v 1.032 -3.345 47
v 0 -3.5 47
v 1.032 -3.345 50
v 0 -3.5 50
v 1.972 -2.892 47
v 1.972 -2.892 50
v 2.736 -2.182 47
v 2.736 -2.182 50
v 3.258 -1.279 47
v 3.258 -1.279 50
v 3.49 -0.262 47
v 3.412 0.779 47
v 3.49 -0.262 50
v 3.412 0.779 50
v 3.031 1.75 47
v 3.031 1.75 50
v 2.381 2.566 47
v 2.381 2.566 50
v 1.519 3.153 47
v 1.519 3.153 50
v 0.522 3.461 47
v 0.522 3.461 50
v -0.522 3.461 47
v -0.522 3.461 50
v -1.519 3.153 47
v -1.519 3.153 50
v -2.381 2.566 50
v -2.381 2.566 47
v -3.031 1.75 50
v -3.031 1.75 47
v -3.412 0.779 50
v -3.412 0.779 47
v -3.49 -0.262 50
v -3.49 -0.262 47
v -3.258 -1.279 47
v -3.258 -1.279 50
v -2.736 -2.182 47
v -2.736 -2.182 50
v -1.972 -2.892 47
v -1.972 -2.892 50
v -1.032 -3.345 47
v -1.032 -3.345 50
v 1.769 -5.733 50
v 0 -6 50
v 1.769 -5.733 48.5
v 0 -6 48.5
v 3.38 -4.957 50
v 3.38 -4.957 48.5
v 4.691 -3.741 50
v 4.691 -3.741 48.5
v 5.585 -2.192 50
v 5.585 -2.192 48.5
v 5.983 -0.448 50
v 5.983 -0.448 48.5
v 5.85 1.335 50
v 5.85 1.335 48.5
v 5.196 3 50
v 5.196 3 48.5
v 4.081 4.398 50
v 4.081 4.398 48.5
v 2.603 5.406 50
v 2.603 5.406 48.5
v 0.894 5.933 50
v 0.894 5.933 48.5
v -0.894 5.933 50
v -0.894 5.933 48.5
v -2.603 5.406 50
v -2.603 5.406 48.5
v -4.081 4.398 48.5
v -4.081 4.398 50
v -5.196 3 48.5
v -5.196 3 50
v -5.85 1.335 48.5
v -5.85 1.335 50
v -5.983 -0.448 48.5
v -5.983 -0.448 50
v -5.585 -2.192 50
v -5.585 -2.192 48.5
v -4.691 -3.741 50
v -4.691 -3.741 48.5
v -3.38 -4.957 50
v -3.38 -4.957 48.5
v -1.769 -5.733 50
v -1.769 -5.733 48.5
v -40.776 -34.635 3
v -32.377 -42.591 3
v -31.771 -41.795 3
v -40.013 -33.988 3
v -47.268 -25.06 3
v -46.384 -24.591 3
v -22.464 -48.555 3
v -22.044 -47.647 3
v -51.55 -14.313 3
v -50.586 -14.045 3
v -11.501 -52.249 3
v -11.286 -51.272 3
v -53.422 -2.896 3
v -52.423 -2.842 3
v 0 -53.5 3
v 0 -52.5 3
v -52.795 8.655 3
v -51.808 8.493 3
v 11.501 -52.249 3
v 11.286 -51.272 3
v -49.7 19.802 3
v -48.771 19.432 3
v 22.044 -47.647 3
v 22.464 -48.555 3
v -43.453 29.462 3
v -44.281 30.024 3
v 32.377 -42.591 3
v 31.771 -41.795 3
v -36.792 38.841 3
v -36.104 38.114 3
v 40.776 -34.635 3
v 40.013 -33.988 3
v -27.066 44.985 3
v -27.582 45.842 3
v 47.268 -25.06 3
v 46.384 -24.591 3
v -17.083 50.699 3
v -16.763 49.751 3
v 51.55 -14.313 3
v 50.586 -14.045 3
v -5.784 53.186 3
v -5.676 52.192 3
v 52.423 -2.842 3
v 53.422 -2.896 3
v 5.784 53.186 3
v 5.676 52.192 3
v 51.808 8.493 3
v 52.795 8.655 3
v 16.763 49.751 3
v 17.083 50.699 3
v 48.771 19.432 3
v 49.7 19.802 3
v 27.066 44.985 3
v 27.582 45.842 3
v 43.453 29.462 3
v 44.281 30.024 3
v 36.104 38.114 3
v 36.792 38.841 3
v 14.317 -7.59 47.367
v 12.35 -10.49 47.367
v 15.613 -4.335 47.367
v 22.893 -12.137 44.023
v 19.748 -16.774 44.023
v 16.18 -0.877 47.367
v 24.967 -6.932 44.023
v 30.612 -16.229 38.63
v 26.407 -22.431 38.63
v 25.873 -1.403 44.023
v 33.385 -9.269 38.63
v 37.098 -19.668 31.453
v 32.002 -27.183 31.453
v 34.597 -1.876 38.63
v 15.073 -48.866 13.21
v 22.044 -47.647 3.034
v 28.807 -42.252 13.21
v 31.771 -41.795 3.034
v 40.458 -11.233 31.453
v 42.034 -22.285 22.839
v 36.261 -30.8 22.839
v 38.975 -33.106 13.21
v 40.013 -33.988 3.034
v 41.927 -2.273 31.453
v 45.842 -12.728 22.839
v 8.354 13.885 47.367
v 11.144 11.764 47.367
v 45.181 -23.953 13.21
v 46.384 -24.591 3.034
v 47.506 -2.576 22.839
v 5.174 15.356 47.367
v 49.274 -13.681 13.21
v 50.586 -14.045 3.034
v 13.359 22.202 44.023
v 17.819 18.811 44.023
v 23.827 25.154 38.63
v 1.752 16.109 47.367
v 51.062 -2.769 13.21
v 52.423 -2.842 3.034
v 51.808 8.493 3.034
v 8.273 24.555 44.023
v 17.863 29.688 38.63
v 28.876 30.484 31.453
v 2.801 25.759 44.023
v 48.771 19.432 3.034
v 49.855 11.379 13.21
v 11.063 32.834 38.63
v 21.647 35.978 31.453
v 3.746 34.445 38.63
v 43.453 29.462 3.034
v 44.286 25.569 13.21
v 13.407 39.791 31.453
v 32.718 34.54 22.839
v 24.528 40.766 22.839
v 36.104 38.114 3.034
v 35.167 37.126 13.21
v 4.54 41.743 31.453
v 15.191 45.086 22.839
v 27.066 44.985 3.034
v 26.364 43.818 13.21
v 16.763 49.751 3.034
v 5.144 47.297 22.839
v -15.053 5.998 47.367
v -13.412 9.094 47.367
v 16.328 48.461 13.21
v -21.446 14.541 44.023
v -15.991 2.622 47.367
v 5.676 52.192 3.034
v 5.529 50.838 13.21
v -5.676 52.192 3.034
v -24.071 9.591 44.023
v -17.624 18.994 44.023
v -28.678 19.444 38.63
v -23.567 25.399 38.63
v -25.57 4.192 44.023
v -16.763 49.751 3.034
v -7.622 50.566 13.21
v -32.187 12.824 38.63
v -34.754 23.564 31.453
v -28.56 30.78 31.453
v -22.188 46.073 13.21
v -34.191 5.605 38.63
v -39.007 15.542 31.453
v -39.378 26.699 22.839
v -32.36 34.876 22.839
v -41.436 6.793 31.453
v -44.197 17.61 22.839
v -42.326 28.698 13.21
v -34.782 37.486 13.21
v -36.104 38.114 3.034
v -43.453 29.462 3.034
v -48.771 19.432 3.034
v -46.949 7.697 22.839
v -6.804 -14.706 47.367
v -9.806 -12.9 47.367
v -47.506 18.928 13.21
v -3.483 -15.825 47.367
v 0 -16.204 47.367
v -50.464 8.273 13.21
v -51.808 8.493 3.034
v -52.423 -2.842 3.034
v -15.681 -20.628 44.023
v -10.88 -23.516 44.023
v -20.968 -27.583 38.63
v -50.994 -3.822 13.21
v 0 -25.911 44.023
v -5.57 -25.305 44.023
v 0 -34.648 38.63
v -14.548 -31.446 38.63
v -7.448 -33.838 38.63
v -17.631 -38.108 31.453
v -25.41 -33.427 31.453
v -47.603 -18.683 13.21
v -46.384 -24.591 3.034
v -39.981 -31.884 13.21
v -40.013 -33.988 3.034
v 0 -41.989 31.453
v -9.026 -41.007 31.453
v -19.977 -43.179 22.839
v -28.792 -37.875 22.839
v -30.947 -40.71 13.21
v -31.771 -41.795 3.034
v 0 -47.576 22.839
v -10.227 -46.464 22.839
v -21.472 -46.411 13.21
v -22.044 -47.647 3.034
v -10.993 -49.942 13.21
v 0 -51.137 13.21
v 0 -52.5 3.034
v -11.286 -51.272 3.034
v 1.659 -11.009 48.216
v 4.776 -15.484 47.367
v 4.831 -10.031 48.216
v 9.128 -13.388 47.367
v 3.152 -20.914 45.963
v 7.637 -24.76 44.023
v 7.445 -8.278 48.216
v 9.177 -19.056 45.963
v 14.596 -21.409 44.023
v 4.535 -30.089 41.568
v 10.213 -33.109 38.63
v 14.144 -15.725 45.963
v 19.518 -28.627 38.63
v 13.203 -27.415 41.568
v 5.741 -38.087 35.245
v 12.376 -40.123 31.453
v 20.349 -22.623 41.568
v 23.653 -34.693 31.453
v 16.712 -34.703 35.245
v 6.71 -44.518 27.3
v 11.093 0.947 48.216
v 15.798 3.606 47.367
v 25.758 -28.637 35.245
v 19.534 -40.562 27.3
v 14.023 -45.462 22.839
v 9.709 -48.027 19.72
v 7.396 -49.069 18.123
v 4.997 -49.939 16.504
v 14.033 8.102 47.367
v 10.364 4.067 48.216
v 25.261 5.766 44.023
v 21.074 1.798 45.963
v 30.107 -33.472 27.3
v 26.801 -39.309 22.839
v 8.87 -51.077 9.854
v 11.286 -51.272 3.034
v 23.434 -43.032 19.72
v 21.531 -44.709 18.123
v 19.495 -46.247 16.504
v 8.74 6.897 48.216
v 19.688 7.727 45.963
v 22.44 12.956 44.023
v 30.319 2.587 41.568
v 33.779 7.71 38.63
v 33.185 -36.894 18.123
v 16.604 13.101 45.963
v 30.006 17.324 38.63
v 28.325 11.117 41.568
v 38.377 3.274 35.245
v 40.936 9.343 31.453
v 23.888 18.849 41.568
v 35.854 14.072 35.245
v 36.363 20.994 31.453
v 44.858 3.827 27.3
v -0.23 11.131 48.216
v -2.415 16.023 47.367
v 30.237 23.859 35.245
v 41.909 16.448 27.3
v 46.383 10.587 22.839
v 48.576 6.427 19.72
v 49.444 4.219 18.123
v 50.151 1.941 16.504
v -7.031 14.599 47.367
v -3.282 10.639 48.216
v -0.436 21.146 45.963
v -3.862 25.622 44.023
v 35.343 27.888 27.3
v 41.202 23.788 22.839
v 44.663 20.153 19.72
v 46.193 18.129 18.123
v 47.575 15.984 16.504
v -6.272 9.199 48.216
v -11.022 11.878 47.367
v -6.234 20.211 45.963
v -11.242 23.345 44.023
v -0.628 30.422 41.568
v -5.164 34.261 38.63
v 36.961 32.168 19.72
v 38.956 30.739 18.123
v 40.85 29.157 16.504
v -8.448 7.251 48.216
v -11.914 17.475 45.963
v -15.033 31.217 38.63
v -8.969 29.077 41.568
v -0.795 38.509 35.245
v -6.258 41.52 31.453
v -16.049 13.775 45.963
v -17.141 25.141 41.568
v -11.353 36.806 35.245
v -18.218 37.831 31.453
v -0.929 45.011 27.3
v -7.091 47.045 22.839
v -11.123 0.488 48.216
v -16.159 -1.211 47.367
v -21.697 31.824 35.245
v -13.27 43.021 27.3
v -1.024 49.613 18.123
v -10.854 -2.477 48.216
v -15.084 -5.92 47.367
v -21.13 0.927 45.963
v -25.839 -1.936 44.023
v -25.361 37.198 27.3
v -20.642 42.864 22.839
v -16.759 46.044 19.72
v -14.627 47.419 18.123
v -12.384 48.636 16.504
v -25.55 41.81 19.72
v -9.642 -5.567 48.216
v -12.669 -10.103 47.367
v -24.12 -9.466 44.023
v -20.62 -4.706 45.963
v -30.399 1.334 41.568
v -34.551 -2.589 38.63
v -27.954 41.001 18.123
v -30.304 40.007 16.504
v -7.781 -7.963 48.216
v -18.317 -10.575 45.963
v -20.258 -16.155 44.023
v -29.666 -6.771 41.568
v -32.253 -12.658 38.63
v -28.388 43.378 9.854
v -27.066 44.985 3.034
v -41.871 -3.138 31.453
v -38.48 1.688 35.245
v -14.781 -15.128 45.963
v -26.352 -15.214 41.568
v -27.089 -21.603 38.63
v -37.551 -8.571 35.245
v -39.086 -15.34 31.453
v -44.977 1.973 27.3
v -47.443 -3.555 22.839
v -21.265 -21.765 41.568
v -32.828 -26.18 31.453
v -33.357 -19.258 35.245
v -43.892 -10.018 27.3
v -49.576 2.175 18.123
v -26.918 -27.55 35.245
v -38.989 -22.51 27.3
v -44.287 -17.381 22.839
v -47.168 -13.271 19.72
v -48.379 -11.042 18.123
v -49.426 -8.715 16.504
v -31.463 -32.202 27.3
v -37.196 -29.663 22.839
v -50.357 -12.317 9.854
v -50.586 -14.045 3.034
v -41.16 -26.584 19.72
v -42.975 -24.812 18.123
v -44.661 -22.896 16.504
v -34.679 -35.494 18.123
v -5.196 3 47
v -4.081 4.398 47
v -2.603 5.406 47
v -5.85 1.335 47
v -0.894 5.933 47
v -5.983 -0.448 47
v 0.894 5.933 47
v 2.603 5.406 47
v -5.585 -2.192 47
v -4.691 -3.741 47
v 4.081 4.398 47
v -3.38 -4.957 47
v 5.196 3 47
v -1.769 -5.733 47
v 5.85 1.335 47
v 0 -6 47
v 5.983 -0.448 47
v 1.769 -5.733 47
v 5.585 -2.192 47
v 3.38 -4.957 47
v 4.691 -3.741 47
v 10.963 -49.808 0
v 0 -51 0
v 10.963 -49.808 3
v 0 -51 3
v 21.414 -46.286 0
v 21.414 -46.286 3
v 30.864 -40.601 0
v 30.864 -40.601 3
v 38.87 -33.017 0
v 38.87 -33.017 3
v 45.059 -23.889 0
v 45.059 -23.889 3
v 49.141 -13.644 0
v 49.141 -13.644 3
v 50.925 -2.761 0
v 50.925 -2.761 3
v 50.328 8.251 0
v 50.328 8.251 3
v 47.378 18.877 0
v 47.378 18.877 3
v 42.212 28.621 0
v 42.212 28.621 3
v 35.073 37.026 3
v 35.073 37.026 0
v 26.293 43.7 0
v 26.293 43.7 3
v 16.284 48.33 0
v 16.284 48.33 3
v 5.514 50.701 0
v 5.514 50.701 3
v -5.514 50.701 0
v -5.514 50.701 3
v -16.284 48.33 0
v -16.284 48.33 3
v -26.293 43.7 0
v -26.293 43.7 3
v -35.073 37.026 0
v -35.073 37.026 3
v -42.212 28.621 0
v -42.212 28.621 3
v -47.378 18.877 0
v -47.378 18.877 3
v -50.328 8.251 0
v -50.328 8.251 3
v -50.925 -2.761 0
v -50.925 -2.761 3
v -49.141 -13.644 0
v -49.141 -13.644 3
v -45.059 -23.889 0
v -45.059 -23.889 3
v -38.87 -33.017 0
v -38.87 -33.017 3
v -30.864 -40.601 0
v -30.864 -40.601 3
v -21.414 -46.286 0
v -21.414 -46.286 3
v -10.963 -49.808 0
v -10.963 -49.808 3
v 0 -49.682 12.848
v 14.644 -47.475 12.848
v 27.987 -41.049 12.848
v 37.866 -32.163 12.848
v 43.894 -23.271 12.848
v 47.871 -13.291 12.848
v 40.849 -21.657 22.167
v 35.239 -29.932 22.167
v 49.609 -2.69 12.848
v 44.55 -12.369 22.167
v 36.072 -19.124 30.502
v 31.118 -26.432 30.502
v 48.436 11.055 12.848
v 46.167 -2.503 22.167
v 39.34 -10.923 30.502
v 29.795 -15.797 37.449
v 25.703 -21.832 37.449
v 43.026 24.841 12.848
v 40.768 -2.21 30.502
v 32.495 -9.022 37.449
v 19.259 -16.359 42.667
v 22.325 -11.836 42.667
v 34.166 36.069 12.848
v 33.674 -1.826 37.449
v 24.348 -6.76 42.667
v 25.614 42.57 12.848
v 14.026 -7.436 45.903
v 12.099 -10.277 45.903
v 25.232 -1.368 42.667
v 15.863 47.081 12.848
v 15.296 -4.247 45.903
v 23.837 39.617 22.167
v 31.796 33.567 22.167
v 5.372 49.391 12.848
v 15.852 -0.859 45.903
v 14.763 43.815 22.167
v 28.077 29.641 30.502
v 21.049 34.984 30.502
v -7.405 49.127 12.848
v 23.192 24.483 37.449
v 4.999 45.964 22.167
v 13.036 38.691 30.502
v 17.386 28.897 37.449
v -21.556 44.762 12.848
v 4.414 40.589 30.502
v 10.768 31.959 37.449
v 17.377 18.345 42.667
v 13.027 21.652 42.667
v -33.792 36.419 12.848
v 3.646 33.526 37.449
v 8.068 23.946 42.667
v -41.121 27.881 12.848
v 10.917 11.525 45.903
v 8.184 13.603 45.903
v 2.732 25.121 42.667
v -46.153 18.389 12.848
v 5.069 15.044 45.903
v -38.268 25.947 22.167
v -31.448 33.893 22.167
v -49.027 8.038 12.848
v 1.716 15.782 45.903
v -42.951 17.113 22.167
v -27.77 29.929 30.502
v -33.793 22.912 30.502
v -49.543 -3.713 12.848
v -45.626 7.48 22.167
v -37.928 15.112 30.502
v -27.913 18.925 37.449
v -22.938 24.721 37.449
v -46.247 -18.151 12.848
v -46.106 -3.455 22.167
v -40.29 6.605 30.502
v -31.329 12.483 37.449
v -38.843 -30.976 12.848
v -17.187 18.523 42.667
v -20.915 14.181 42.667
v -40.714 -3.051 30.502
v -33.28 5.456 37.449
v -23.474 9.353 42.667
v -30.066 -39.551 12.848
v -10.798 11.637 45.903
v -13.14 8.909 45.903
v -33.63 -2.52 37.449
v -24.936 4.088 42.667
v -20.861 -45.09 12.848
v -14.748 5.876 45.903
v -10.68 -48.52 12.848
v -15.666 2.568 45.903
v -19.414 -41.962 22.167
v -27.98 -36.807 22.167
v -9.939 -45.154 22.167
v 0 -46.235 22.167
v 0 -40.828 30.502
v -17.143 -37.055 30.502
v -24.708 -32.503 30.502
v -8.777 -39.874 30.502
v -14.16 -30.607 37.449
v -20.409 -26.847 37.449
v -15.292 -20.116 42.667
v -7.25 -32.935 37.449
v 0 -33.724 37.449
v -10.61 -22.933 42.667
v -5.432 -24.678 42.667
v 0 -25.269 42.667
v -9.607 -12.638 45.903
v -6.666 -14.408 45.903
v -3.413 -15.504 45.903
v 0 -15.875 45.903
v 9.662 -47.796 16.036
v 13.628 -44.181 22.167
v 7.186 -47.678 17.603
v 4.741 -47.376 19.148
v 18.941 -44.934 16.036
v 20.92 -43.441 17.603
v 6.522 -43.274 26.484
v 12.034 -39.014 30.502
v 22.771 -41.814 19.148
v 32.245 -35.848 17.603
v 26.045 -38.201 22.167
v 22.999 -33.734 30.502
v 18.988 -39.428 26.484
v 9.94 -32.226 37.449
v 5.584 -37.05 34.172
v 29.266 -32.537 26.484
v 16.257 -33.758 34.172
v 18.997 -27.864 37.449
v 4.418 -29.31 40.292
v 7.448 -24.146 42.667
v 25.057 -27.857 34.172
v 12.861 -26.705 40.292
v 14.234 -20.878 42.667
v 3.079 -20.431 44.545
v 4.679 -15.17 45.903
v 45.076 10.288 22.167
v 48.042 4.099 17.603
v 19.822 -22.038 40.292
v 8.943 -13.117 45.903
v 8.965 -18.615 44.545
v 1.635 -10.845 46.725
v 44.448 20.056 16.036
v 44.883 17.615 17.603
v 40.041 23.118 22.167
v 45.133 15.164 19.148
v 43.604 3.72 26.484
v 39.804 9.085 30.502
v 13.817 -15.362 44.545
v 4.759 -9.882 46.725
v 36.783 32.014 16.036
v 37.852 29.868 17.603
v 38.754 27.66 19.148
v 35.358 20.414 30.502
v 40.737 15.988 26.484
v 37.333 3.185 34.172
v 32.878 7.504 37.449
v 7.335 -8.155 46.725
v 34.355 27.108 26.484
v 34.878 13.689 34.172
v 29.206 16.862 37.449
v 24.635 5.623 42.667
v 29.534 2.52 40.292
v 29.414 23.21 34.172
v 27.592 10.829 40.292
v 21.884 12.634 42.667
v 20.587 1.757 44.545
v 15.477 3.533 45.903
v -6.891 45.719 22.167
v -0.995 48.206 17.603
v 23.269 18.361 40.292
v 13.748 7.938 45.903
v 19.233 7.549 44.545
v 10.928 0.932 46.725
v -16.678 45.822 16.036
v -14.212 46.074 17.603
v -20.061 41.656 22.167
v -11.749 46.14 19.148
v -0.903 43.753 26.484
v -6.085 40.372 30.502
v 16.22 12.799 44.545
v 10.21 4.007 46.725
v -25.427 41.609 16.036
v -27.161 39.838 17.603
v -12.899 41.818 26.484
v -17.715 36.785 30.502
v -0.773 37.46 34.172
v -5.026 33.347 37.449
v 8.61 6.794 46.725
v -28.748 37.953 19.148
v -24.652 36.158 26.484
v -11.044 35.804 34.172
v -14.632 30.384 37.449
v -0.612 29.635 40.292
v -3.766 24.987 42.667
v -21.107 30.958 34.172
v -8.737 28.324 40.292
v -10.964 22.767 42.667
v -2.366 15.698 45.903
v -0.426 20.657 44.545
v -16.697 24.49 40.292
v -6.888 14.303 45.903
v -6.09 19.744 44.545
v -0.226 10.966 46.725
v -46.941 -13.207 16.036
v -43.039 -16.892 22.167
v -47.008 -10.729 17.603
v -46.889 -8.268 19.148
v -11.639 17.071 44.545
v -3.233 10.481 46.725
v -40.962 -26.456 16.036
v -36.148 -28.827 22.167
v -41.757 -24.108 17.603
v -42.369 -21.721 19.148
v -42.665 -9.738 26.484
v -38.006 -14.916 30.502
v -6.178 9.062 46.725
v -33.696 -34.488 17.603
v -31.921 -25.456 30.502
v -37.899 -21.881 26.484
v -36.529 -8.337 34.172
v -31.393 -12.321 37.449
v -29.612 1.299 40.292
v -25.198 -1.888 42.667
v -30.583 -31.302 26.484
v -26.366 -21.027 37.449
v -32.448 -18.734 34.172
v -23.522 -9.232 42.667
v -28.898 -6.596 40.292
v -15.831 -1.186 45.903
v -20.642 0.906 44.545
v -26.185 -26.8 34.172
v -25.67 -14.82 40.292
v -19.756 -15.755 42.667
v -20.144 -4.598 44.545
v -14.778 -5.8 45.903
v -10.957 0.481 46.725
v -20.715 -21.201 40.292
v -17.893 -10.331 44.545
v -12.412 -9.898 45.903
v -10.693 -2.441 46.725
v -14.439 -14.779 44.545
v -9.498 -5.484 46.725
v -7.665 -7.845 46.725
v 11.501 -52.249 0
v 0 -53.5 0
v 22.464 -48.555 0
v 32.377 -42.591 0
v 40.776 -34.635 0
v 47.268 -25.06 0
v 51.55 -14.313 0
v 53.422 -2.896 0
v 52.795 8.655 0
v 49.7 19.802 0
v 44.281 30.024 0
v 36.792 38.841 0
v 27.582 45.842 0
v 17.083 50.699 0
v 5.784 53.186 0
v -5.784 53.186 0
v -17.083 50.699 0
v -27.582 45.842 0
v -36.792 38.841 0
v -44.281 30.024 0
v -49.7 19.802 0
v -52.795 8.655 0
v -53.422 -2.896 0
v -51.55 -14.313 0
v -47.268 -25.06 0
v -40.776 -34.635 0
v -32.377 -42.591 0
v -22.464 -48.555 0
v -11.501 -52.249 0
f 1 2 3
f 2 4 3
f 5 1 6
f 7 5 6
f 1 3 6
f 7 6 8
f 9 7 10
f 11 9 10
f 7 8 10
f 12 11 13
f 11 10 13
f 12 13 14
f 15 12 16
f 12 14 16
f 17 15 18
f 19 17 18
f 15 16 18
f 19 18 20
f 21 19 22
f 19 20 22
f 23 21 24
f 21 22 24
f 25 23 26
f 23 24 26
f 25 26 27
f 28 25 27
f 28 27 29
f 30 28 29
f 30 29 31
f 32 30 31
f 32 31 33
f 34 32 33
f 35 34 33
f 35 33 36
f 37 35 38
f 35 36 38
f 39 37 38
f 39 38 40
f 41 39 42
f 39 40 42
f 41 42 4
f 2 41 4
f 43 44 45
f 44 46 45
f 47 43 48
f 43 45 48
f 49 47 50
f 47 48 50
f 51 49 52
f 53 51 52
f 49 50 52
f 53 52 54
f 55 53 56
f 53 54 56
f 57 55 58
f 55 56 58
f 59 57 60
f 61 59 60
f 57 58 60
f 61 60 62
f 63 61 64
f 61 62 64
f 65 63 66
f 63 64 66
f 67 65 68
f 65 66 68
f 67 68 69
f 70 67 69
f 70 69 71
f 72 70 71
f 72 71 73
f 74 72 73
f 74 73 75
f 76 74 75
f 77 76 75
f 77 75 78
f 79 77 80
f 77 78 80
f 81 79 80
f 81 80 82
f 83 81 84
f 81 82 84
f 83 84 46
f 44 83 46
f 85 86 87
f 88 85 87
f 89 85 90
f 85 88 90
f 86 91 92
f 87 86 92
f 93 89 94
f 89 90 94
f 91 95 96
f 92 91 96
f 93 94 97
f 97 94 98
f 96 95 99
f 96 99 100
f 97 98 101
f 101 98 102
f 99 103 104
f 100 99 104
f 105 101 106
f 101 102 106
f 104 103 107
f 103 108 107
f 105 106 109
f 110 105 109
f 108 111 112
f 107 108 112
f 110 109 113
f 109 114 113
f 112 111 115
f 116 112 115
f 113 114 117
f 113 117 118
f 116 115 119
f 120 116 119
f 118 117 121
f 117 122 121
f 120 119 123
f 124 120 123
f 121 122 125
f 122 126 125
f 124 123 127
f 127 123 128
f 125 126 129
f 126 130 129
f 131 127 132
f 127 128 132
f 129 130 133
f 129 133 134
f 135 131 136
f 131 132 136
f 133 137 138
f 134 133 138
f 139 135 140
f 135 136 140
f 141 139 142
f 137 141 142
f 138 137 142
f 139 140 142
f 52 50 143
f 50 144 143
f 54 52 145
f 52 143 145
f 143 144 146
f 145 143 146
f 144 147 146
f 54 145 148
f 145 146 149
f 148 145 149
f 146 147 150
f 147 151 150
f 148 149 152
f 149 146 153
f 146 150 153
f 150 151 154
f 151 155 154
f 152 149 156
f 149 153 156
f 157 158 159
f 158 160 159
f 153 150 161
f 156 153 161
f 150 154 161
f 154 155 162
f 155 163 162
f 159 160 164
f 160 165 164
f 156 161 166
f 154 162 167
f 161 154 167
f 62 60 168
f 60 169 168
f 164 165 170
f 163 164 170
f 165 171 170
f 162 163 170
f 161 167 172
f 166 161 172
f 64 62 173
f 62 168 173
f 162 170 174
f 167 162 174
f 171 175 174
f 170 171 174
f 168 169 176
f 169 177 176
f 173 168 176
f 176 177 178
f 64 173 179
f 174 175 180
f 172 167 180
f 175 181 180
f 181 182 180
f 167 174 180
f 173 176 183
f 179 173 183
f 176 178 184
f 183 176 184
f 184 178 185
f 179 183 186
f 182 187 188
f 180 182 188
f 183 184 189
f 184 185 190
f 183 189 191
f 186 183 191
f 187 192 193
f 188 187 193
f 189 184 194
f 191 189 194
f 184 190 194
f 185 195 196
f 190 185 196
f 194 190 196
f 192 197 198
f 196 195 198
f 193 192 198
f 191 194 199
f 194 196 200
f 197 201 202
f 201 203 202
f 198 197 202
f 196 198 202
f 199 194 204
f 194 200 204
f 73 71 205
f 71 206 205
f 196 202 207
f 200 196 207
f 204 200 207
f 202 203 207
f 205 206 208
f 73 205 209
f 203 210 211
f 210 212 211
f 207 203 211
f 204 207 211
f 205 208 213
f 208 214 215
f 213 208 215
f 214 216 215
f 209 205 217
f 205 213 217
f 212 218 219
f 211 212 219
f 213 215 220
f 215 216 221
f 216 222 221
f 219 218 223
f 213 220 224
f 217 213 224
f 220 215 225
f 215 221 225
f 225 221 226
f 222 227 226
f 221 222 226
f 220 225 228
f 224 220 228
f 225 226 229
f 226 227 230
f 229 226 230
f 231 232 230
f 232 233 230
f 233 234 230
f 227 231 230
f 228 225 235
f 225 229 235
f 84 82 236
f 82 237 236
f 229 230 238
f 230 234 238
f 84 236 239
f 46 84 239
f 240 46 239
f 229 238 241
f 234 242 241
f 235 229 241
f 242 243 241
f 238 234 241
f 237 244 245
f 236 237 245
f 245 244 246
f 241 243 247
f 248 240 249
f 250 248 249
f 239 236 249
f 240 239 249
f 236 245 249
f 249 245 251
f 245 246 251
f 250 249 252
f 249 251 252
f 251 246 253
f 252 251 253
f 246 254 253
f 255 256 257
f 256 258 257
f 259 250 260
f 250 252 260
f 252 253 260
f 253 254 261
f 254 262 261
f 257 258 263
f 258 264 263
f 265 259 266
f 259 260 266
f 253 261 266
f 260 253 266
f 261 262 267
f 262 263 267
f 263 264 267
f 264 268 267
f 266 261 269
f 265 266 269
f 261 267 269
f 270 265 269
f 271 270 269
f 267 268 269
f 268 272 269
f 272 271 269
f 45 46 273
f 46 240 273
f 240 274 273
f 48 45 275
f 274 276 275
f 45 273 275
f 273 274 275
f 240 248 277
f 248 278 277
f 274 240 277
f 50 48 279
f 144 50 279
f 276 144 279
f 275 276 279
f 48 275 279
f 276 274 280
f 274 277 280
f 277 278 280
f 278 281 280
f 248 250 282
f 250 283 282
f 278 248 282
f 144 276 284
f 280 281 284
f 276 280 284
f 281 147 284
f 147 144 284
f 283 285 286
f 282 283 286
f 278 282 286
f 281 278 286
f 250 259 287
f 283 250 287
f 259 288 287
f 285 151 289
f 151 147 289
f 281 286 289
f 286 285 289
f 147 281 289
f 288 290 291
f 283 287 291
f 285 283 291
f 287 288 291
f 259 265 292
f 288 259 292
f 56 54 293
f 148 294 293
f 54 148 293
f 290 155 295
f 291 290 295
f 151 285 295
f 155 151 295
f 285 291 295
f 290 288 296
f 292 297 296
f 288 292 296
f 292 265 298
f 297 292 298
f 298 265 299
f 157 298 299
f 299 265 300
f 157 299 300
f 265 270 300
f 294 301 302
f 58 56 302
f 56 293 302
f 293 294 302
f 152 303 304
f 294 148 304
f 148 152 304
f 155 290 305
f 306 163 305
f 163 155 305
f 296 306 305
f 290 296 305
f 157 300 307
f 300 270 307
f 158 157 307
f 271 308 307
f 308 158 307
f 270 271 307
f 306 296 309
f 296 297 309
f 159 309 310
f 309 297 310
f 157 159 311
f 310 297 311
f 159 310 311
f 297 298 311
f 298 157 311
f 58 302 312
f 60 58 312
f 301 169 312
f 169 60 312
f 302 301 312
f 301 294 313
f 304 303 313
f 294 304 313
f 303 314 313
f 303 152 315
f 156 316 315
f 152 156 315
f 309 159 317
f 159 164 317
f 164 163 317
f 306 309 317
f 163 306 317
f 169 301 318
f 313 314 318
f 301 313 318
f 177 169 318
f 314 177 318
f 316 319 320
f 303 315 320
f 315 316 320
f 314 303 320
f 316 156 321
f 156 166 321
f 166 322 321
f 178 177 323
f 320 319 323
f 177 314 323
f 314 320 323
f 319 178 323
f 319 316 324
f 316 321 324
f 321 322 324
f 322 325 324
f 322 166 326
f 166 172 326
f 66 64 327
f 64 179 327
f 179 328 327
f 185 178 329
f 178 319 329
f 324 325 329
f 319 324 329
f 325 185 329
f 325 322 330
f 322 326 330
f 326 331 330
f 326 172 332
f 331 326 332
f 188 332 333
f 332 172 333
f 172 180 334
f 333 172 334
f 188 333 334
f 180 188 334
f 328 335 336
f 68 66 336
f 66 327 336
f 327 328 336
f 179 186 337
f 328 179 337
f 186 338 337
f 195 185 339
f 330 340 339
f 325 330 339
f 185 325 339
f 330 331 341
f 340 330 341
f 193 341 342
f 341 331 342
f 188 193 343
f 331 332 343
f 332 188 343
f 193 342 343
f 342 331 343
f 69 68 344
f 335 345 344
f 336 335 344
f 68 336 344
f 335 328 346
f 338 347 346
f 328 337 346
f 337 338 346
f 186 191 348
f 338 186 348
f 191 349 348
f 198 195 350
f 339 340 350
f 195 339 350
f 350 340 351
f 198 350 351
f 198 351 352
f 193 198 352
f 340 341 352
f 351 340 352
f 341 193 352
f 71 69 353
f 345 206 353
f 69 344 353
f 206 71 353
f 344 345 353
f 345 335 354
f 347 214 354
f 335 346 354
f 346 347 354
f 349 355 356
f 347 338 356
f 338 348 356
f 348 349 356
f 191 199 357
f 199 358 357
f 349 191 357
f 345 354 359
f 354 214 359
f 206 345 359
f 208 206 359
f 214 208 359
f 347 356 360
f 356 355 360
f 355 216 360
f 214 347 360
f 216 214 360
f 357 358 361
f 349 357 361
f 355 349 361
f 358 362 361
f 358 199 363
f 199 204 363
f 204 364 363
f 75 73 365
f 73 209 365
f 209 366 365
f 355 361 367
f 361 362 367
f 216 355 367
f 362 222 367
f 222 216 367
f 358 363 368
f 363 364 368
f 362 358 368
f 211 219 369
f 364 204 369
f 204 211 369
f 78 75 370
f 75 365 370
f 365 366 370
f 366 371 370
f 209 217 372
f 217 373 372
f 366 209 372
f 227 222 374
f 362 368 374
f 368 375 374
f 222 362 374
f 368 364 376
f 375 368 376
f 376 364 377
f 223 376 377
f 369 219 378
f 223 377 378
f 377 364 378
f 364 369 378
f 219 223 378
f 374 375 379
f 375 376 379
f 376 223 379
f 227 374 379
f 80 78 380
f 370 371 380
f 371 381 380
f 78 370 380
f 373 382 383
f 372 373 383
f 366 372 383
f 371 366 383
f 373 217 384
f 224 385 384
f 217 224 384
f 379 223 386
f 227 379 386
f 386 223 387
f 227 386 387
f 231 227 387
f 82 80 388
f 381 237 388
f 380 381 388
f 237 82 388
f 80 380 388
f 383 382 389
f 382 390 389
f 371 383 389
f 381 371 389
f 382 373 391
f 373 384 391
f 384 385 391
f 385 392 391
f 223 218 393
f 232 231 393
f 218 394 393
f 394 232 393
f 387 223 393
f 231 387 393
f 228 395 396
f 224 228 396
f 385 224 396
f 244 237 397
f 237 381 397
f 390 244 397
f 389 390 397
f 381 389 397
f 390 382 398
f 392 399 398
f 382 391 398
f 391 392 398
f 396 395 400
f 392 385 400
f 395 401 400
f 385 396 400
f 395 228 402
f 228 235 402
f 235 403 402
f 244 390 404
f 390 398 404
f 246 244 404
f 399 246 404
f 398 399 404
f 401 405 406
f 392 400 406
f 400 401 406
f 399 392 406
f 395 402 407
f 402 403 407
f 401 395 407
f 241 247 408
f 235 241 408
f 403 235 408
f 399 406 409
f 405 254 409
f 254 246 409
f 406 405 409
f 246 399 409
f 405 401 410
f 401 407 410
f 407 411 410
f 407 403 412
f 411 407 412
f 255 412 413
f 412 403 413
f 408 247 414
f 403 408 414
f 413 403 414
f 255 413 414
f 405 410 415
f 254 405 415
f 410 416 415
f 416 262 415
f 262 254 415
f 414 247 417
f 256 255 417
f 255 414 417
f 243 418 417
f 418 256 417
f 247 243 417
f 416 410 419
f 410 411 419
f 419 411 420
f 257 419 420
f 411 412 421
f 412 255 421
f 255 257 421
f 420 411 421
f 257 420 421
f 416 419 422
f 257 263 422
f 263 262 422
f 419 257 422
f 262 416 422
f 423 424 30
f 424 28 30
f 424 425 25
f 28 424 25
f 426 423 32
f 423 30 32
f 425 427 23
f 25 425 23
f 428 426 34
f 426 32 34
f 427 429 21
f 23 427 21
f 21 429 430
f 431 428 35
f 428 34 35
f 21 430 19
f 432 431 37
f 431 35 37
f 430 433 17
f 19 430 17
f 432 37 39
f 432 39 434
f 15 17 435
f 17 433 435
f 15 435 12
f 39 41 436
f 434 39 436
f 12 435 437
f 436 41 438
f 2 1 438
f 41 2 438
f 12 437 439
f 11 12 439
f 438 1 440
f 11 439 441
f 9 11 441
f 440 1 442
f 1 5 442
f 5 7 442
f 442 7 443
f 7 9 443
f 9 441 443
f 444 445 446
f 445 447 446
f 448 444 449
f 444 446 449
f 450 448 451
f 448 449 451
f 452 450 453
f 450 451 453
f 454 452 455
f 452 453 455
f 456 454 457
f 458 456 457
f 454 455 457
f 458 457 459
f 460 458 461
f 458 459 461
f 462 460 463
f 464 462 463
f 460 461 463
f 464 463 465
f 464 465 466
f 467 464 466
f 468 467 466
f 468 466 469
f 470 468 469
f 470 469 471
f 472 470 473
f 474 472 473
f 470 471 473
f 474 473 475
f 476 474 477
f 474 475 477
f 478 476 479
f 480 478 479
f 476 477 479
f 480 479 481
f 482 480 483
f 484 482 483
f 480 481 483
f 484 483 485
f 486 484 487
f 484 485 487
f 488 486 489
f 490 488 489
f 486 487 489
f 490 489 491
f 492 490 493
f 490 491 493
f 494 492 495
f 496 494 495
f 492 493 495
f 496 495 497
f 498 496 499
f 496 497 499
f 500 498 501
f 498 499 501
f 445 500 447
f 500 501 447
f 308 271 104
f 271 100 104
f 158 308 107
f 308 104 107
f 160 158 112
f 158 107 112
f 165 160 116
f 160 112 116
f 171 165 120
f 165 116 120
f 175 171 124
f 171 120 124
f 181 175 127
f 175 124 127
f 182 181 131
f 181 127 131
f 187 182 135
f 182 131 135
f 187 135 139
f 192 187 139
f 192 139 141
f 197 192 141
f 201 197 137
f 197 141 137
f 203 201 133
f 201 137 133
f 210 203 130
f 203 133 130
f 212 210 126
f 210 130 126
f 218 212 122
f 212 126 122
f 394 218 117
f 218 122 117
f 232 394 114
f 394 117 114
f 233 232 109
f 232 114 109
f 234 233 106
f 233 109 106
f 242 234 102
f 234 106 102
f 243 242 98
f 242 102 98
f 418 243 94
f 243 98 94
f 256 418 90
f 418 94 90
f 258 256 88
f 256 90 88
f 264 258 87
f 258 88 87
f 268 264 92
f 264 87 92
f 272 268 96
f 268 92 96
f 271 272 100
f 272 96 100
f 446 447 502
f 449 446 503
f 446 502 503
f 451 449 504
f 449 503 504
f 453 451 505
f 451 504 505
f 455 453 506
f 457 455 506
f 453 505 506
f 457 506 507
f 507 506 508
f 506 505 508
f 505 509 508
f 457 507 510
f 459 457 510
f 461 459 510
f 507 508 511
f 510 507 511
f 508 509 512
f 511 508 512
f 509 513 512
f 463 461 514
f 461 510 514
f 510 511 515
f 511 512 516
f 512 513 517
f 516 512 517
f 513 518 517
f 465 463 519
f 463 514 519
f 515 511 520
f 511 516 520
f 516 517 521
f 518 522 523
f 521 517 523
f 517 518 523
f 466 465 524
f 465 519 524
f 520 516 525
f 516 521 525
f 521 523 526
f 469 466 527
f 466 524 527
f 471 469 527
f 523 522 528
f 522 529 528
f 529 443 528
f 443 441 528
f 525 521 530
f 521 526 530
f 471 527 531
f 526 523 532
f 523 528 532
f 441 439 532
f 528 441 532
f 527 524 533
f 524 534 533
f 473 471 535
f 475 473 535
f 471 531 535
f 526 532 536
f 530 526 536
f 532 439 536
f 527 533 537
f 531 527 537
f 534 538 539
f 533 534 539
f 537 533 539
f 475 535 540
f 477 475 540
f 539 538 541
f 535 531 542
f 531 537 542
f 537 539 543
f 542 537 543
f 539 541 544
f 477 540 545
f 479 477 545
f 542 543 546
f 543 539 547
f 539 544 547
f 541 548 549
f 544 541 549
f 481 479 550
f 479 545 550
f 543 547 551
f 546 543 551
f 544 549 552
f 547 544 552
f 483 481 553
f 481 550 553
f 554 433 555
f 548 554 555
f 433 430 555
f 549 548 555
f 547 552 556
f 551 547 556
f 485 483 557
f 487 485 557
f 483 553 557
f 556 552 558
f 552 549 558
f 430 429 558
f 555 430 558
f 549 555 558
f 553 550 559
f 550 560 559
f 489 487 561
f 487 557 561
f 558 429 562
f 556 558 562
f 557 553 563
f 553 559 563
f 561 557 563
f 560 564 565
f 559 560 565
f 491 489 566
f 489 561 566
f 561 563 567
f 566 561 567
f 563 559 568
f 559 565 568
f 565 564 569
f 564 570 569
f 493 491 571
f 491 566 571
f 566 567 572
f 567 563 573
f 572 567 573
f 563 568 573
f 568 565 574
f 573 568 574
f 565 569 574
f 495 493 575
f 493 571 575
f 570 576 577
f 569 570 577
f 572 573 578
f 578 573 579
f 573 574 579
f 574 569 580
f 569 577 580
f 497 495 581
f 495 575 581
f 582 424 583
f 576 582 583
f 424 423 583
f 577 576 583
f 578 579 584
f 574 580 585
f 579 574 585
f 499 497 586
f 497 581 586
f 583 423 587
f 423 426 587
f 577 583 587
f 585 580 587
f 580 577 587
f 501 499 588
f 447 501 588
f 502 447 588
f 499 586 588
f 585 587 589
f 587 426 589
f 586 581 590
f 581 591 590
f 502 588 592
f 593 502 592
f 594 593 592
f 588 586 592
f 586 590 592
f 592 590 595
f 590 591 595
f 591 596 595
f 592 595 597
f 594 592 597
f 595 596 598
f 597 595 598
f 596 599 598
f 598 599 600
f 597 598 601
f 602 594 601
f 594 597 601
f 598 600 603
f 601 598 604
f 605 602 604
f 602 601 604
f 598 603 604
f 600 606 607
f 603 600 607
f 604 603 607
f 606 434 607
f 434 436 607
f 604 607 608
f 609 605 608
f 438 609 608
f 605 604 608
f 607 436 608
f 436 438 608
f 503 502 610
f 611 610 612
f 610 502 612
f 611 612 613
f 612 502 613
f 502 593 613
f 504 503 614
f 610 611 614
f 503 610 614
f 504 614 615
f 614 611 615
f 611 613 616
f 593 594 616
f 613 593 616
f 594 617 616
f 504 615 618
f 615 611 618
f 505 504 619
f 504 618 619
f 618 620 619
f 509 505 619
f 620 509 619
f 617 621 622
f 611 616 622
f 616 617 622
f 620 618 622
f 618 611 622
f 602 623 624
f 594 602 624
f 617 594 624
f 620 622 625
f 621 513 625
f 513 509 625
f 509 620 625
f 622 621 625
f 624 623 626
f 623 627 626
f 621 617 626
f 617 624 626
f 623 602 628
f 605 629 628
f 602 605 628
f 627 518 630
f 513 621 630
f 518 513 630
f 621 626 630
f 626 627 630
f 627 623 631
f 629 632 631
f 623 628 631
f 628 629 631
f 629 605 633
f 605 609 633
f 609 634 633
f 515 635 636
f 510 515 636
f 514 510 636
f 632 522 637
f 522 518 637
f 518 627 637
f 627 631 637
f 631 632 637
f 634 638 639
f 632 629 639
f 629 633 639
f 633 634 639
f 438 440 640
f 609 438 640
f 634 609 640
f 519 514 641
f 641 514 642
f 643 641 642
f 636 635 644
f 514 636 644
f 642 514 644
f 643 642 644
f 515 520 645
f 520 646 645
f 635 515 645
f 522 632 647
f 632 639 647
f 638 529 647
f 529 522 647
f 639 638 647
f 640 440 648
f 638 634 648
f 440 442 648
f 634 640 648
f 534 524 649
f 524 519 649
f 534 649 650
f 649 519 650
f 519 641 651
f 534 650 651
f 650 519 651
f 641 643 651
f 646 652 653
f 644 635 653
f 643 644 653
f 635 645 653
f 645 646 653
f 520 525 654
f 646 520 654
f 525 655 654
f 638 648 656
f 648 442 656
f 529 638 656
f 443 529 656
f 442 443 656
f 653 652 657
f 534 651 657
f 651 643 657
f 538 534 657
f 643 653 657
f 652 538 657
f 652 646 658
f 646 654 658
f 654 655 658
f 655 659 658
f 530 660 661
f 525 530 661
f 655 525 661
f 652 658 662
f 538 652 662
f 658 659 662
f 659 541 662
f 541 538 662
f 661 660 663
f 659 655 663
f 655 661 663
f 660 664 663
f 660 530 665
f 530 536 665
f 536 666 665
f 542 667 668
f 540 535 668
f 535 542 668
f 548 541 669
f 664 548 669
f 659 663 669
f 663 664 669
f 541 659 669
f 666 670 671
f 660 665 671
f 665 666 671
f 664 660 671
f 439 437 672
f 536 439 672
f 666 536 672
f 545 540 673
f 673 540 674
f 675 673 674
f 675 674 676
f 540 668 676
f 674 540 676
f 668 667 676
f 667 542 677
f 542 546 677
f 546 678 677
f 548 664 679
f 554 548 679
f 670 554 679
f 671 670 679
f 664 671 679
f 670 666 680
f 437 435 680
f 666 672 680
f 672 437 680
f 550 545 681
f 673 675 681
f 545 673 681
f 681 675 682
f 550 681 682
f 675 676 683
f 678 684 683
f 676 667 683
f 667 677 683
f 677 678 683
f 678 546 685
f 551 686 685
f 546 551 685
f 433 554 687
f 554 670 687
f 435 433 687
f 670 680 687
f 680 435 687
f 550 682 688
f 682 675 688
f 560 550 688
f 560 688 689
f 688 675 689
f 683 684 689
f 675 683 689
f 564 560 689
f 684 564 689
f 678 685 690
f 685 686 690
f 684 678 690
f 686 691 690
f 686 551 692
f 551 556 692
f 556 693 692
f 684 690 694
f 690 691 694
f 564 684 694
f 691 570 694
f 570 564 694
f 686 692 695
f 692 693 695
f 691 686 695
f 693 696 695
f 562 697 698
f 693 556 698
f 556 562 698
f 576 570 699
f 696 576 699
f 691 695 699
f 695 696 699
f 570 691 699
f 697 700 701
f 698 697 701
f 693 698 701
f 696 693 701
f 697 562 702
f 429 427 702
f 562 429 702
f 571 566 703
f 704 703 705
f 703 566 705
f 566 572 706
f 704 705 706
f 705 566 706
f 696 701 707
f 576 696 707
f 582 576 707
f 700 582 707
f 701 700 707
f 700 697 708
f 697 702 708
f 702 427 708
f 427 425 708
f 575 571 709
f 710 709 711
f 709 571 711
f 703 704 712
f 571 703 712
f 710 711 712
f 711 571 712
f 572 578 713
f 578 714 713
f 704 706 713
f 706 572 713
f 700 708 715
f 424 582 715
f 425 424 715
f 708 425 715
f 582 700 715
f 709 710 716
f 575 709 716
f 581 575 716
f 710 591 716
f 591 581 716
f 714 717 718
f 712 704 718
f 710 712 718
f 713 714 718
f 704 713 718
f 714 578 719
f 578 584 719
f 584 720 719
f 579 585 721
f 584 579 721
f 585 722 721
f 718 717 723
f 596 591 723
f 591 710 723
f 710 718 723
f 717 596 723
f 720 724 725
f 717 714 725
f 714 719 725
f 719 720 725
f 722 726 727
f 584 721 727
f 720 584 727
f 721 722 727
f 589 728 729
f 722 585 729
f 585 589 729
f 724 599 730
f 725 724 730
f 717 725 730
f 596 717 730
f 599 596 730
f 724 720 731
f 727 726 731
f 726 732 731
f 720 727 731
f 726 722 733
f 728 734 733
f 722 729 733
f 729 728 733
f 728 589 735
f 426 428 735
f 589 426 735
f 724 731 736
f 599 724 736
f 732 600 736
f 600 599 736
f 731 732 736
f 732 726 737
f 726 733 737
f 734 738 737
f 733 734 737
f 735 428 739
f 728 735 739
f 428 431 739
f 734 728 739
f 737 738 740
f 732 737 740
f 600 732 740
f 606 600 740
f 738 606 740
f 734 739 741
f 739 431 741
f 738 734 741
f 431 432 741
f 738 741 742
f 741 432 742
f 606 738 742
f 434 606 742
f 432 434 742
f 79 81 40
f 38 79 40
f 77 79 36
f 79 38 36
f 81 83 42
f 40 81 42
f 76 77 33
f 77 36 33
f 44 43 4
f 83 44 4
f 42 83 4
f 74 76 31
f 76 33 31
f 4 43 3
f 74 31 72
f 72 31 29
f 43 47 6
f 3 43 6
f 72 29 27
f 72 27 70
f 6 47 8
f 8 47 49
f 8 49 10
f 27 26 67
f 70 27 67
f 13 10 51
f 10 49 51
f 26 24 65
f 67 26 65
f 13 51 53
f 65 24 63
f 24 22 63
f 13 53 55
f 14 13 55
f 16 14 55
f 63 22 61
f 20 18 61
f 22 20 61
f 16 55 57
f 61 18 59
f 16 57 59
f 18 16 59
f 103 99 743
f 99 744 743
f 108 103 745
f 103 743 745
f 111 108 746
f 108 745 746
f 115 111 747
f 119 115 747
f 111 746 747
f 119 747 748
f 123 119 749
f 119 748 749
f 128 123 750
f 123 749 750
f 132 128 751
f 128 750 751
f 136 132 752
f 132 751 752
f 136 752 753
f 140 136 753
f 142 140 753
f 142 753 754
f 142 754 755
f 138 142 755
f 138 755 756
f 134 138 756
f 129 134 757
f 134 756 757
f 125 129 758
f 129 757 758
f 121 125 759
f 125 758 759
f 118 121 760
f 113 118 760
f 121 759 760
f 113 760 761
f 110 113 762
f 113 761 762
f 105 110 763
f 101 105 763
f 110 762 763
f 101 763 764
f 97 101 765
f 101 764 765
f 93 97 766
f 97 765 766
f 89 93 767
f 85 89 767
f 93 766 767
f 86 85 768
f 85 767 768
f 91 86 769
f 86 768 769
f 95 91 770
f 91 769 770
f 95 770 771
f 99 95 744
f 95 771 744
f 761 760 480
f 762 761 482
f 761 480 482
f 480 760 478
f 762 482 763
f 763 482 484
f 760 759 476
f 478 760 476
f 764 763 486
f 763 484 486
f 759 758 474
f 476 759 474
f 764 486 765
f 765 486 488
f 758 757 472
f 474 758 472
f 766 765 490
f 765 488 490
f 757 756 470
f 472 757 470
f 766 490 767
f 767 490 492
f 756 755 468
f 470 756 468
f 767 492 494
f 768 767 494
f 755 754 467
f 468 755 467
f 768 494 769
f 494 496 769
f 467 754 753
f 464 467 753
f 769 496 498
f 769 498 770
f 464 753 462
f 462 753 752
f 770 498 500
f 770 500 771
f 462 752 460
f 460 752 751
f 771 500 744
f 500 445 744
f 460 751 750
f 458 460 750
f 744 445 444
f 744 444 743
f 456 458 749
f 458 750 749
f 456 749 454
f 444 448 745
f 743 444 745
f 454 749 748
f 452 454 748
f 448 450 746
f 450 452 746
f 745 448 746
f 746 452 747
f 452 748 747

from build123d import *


with BuildPart() as f1:
    # F0 (on Right) → F1 (revolve)
    with BuildSketch(Plane.YZ):
        Polygon((-53.5, 3), (-53.5, 0), (-51, 0), (-51, 3), (-52.499621, 3), align=None)
        Polygon((-6, 48.5), (-6, 47), (-3.5, 47), (-3.5, 50), (-6, 50), align=None)
        with BuildLine():
            Line((-52.499621, 3), (-51, 3))
            ThreePointArc((-51, 3), (-37.468238, 34.172062), (-6, 47))
            Line((-6, 47), (-6, 48.5))
            ThreePointArc((-6, 48.5), (-38.516914, 35.244572), (-52.499621, 3.033704))
            Line((-52.499621, 3.033704), (-52.499621, 3))
        make_face()
    revolve(axis=Axis((0, 0, 18.903965), (0, 0, 1)))


solid = f1.part
